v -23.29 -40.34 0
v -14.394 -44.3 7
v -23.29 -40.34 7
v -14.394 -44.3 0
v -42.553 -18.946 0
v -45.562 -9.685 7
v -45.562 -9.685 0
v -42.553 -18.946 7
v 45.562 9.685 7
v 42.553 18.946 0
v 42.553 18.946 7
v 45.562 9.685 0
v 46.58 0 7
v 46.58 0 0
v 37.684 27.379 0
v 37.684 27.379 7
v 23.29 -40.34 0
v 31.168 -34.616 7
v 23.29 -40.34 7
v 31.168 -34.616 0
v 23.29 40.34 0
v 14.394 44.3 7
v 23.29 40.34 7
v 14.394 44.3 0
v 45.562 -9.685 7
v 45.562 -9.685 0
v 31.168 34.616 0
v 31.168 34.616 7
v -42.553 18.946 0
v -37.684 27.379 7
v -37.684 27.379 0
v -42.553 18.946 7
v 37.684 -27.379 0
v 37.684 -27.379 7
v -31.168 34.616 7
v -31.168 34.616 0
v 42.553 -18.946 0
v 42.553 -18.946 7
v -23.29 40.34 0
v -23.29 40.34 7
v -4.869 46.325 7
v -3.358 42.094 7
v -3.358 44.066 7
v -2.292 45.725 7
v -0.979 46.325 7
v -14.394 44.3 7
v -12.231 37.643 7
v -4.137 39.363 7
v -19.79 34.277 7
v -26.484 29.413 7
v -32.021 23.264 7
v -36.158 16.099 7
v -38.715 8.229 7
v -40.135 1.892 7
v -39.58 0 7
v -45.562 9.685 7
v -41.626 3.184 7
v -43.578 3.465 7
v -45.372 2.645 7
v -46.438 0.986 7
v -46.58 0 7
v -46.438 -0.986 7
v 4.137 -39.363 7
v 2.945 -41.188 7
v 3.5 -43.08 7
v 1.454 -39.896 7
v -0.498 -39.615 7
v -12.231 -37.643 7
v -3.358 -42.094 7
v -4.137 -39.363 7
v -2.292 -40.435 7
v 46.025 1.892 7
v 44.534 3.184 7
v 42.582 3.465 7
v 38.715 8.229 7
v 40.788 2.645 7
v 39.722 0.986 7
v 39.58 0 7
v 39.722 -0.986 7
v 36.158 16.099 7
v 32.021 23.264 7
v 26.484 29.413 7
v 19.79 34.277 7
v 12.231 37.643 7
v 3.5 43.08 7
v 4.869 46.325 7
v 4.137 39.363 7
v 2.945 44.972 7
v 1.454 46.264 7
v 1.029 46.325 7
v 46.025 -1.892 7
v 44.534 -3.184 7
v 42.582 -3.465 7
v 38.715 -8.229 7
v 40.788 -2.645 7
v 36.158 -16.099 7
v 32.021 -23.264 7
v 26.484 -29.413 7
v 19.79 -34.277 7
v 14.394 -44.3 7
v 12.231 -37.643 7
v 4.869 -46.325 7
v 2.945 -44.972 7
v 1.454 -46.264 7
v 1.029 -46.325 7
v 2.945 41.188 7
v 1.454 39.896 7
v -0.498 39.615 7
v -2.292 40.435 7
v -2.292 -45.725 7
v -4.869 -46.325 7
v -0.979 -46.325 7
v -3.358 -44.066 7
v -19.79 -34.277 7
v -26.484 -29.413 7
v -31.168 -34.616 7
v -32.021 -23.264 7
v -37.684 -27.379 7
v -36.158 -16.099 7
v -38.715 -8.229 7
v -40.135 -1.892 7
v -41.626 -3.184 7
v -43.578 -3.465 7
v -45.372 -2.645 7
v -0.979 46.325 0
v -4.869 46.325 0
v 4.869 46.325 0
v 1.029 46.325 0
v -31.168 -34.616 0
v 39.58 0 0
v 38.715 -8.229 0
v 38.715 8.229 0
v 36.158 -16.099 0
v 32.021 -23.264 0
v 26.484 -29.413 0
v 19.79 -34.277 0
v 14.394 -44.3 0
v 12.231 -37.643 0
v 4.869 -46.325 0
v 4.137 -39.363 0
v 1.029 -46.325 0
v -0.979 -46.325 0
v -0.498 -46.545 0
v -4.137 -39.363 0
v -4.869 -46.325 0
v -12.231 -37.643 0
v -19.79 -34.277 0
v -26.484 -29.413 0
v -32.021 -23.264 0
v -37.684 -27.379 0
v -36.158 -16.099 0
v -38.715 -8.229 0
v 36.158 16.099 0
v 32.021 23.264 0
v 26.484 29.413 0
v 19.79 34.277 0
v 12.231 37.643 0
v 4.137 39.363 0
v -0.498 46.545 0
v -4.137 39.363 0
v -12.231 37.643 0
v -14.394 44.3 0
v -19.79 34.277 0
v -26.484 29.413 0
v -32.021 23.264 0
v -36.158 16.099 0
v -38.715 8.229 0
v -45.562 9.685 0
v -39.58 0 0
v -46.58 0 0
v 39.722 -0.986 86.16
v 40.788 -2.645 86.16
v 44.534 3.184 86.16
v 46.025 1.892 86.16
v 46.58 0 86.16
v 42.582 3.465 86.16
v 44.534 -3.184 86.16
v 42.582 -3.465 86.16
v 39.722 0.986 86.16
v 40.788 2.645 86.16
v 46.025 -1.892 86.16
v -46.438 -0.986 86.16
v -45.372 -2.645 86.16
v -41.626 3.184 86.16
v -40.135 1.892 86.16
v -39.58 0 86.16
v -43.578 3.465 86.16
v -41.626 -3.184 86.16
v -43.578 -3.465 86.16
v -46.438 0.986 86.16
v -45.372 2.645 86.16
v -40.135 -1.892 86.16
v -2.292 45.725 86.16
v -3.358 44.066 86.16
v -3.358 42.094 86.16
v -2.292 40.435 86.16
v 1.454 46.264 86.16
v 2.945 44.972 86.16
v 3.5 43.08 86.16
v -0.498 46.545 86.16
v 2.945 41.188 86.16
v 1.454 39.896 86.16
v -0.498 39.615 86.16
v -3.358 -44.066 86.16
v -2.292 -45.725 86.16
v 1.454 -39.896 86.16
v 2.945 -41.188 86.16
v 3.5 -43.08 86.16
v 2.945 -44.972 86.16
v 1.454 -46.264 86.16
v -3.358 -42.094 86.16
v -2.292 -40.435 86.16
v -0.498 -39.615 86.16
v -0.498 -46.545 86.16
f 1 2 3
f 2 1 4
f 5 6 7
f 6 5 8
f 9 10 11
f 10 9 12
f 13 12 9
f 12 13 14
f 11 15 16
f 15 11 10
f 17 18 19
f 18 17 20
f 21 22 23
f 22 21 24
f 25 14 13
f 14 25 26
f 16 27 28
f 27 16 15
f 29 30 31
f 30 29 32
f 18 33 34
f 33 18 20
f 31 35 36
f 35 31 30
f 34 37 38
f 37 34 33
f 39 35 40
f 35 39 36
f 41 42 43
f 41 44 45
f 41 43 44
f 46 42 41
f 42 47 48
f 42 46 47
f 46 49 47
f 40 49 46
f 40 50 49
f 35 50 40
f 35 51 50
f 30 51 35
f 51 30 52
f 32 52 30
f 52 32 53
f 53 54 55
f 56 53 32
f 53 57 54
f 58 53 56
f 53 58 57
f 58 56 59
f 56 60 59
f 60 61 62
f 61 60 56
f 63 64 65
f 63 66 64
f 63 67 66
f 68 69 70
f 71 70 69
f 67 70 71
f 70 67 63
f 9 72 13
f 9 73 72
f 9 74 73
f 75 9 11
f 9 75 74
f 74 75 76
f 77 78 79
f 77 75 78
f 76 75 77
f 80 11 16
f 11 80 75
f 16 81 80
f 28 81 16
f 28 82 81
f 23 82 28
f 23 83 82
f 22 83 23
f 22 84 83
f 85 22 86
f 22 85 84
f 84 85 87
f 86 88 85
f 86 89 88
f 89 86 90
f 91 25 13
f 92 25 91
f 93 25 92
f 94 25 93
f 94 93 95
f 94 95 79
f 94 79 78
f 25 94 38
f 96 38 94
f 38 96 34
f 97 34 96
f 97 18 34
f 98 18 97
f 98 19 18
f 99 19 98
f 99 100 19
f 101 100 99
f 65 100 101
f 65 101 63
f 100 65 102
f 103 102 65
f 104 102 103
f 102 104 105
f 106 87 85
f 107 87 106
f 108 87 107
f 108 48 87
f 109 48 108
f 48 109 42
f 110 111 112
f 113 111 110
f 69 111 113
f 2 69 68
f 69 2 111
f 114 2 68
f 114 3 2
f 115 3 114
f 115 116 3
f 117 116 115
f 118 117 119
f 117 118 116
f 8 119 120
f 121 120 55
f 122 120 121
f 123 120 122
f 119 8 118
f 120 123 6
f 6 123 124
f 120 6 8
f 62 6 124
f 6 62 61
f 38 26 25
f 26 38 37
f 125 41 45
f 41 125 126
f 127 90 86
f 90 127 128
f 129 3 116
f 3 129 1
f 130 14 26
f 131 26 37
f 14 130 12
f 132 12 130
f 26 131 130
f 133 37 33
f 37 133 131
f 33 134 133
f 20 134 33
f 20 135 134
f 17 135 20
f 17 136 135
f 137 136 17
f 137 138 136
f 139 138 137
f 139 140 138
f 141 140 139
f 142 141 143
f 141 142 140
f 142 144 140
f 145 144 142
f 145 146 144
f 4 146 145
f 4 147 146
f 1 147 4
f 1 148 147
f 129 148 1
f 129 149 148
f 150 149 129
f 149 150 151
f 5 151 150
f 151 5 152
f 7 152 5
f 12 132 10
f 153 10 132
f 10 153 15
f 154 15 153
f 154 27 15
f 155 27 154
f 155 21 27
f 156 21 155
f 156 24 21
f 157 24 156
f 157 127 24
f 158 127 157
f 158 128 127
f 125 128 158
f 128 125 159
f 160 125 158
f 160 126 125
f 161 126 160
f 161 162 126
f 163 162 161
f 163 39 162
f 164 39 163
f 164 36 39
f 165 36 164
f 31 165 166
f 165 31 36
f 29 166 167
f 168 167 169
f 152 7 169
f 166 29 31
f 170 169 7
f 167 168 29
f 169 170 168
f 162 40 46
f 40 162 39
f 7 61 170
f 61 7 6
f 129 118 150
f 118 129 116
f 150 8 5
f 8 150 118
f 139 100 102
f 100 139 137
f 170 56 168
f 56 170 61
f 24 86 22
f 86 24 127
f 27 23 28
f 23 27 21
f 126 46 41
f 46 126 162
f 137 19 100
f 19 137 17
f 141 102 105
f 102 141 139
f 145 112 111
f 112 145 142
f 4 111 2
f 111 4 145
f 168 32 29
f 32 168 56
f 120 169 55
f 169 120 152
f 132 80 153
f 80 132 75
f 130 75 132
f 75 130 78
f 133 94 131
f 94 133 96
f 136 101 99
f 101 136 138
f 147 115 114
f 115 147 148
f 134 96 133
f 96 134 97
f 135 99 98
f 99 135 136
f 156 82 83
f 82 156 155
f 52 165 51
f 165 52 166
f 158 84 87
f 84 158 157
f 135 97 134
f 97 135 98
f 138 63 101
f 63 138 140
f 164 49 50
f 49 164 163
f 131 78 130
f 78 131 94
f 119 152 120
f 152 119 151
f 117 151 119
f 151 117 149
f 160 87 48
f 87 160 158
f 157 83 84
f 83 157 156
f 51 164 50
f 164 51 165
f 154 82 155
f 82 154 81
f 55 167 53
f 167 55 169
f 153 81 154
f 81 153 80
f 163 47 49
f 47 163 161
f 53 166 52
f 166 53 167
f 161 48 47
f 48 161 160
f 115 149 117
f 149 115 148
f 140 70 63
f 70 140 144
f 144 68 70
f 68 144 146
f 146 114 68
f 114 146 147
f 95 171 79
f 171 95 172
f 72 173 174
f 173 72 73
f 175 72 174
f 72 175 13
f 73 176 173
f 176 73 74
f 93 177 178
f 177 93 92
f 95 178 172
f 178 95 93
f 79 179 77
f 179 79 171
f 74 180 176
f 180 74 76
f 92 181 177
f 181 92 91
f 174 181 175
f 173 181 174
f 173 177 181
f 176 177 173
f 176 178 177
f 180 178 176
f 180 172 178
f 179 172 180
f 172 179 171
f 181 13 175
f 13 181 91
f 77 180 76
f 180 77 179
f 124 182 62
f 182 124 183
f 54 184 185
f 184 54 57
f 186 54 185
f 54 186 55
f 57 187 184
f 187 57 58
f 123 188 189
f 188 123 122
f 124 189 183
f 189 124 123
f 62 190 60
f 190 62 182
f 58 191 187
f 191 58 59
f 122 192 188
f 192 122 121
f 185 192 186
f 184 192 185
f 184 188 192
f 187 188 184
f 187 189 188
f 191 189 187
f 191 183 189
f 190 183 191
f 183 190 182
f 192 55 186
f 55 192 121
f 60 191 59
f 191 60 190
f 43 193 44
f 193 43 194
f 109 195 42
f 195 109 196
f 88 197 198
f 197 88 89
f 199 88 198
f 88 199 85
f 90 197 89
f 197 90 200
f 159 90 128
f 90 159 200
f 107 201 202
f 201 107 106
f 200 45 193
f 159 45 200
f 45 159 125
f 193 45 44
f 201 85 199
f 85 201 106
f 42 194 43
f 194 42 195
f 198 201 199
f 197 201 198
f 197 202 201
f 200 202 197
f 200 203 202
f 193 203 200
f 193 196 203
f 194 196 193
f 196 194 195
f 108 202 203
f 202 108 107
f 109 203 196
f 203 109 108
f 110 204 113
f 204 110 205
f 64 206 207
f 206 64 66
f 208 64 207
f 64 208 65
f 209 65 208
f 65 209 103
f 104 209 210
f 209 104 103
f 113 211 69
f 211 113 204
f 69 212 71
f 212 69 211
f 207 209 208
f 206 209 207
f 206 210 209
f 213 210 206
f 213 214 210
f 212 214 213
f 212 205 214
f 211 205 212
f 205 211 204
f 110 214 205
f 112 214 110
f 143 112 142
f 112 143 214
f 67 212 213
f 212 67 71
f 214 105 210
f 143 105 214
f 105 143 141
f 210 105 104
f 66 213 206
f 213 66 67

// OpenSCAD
d_in = 4.;
w_in = 0.325;

difference() {
    cylinder(d=(d_in+w_in)*21.54, h=w_in*21.54);
    cylinder(d=(d_in-w_in)*21.54, h=w_in*21.54);
}

translate([(d_in/2)*21.54,0,0]) cylinder(d=w_in*21.54, h=4*21.54);
translate([-(d_in/2)*21.54,0,0]) cylinder(d=w_in*21.54, h=4*21.54);
translate([0,(d_in/2)*21.54,0]) cylinder(d=w_in*21.54, h=4*21.54);
translate([0,-(d_in/2)*21.54,0]) cylinder(d=w_in*21.54, h=4*21.54);
